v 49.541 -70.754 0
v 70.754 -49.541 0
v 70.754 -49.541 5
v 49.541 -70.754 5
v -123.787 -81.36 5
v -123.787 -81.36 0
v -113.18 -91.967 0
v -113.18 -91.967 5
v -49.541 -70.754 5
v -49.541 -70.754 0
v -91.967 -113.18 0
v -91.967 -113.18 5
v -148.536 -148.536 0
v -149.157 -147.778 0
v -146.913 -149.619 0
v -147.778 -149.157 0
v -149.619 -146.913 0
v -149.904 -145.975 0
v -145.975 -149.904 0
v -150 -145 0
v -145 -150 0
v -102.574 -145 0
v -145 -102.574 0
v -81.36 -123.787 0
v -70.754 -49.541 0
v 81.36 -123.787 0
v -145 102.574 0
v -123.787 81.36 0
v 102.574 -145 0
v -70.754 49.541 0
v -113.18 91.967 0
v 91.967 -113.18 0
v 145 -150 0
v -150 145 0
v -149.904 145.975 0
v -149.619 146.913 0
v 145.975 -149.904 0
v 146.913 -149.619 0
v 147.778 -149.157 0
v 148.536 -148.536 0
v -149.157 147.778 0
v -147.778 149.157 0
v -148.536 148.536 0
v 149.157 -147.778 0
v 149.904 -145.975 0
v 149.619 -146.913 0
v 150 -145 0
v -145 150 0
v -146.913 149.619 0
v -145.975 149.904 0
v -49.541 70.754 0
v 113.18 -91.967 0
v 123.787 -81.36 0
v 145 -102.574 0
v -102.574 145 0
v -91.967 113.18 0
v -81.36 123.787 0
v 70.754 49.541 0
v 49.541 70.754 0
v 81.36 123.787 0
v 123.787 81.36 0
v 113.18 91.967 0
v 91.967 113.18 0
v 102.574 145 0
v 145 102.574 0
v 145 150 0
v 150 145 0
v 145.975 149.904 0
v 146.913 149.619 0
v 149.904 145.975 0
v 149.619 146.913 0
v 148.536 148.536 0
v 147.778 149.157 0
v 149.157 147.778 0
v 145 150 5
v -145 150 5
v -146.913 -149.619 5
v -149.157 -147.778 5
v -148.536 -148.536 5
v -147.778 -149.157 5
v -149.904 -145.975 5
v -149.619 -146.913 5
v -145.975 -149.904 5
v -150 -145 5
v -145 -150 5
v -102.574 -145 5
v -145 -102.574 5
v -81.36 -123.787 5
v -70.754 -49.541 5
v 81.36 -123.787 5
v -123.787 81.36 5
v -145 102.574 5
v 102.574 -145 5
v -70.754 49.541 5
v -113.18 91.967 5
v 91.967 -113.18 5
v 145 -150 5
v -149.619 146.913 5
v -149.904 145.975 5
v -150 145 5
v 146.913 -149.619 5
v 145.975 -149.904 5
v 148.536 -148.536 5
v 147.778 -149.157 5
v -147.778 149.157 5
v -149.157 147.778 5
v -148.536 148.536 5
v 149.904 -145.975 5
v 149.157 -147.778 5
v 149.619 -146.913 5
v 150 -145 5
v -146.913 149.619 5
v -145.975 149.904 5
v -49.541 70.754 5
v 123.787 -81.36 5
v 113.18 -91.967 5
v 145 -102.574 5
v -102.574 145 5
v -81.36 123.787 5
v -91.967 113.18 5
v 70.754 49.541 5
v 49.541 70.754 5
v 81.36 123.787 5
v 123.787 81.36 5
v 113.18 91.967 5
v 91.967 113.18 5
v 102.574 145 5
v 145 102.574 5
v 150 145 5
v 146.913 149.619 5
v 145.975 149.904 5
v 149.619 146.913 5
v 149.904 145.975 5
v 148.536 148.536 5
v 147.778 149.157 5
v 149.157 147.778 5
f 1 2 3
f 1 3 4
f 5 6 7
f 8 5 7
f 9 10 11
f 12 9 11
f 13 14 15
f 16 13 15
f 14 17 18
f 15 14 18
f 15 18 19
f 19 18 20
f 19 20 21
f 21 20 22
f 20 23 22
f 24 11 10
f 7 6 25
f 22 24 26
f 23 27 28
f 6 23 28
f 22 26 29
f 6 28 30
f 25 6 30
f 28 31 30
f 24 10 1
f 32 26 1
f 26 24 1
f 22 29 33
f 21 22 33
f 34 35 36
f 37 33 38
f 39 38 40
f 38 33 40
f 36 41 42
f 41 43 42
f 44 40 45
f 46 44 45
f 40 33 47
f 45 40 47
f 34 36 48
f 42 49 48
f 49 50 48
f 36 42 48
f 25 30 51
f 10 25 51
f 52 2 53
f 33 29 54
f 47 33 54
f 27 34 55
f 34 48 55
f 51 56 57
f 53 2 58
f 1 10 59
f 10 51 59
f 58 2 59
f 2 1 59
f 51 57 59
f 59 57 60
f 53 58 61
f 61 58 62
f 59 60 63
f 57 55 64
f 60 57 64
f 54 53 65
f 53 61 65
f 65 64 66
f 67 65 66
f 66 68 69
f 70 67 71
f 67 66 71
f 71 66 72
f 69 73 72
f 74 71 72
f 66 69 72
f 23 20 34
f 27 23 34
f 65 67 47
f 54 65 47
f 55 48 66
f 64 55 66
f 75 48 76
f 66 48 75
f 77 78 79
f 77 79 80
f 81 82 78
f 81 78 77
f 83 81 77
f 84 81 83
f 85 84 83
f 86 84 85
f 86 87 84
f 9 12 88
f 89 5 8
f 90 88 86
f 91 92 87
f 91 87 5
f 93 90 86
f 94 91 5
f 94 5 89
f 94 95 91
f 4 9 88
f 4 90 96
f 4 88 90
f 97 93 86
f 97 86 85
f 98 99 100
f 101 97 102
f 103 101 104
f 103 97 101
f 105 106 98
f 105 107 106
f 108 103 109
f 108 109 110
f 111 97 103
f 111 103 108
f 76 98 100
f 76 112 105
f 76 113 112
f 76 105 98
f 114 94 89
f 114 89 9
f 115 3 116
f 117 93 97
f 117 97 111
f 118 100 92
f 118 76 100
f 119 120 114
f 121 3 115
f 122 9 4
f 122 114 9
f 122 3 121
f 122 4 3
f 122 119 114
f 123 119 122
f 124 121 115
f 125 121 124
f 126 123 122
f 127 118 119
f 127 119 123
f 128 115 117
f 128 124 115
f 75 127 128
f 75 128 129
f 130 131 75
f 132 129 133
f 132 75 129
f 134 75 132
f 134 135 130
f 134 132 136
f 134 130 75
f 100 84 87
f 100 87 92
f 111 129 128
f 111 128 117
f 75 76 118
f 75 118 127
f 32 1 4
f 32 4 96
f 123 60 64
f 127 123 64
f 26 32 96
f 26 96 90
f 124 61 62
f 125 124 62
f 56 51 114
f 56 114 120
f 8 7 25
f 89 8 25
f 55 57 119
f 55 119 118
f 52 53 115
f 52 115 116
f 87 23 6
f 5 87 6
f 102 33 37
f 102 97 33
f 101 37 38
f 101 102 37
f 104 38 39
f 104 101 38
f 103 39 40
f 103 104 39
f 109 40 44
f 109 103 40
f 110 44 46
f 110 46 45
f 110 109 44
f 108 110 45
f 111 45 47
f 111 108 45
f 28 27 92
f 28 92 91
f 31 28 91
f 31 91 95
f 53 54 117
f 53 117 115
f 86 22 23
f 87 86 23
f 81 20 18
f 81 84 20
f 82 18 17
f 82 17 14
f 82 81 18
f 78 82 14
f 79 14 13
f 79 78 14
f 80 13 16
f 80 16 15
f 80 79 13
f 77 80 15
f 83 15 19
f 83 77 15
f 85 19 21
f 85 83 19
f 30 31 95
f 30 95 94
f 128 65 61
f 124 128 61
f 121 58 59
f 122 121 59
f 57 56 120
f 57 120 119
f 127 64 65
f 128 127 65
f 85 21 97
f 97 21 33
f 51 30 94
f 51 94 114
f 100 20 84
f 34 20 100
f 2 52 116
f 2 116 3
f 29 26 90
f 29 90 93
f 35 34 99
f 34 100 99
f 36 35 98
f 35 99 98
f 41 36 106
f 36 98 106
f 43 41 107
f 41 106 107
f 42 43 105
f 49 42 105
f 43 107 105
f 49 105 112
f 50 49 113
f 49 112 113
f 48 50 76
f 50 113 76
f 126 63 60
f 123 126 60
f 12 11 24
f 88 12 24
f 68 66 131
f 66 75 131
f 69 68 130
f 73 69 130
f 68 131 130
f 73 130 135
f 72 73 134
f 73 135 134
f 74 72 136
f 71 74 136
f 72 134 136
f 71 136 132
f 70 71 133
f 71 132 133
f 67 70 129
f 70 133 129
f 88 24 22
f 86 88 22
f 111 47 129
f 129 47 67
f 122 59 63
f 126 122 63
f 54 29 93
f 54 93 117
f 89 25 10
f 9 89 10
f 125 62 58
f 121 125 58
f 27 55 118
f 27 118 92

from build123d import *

# Parameters (mm, degrees)
ESQUISSE1_W             = 300
ESQUISSE1_H             = 300
BOSS_EXTRU_1_DEPTH      = 5
ENL_V_MAT_EXTRU_1_DEPTH = 5
CONG_1_R                = 5


with BuildPart() as part:
    # Esquisse1 → Boss.-Extru.1 (new body)
    with BuildSketch(Plane.XY):
        Rectangle(ESQUISSE1_W, ESQUISSE1_H)
    extrude(amount=BOSS_EXTRU_1_DEPTH)

    # Esquisse2 → Enlèv. mat.-Extru.1 (cut)
    with BuildSketch(Plane.XY):
        Polygon((-70.753787975, 49.54058454), (-49.54058454, 70.753787975), (-91.966991411, 113.180194847), (-81.360389693, 123.786796564), (-102.573593129, 145), (-145, 102.573593129), (-123.786796564, 81.360389693), (-113.180194847, 91.966991411), align=None)
        Polygon((145, 102.573593129), (123.786796564, 81.360389693), (113.180194847, 91.966991411), (70.753787975, 49.54058454), (49.54058454, 70.753787975), (91.966991411, 113.180194847), (81.360389693, 123.786796564), (102.573593129, 145), align=None)
        Polygon((-70.753787975, -49.54058454), (-49.54058454, -70.753787975), (-91.966991411, -113.180194847), (-81.360389693, -123.786796564), (-102.573593129, -145), (-145, -102.573593129), (-123.786796564, -81.360389693), (-113.180194847, -91.966991411), align=None)
        Polygon((91.966991411, -113.180194847), (81.360389693, -123.786796564), (102.573593129, -145), (145, -102.573593129), (123.786796564, -81.360389693), (113.180194847, -91.966991411), (70.753787975, -49.54058454), (49.54058454, -70.753787975), align=None)
    extrude(amount=ENL_V_MAT_EXTRU_1_DEPTH, mode=Mode.SUBTRACT)

    # Congé1
    cong_1_edges = [part.edges().sort_by_distance(p)[0] for p in [
        (-150, 150, 2.5),
        (150, 150, 2.5),
        (150, -150, 2.5),
        (-150, -150, 2.5),
    ]]
    fillet(cong_1_edges, radius=CONG_1_R)


solid = part.part
